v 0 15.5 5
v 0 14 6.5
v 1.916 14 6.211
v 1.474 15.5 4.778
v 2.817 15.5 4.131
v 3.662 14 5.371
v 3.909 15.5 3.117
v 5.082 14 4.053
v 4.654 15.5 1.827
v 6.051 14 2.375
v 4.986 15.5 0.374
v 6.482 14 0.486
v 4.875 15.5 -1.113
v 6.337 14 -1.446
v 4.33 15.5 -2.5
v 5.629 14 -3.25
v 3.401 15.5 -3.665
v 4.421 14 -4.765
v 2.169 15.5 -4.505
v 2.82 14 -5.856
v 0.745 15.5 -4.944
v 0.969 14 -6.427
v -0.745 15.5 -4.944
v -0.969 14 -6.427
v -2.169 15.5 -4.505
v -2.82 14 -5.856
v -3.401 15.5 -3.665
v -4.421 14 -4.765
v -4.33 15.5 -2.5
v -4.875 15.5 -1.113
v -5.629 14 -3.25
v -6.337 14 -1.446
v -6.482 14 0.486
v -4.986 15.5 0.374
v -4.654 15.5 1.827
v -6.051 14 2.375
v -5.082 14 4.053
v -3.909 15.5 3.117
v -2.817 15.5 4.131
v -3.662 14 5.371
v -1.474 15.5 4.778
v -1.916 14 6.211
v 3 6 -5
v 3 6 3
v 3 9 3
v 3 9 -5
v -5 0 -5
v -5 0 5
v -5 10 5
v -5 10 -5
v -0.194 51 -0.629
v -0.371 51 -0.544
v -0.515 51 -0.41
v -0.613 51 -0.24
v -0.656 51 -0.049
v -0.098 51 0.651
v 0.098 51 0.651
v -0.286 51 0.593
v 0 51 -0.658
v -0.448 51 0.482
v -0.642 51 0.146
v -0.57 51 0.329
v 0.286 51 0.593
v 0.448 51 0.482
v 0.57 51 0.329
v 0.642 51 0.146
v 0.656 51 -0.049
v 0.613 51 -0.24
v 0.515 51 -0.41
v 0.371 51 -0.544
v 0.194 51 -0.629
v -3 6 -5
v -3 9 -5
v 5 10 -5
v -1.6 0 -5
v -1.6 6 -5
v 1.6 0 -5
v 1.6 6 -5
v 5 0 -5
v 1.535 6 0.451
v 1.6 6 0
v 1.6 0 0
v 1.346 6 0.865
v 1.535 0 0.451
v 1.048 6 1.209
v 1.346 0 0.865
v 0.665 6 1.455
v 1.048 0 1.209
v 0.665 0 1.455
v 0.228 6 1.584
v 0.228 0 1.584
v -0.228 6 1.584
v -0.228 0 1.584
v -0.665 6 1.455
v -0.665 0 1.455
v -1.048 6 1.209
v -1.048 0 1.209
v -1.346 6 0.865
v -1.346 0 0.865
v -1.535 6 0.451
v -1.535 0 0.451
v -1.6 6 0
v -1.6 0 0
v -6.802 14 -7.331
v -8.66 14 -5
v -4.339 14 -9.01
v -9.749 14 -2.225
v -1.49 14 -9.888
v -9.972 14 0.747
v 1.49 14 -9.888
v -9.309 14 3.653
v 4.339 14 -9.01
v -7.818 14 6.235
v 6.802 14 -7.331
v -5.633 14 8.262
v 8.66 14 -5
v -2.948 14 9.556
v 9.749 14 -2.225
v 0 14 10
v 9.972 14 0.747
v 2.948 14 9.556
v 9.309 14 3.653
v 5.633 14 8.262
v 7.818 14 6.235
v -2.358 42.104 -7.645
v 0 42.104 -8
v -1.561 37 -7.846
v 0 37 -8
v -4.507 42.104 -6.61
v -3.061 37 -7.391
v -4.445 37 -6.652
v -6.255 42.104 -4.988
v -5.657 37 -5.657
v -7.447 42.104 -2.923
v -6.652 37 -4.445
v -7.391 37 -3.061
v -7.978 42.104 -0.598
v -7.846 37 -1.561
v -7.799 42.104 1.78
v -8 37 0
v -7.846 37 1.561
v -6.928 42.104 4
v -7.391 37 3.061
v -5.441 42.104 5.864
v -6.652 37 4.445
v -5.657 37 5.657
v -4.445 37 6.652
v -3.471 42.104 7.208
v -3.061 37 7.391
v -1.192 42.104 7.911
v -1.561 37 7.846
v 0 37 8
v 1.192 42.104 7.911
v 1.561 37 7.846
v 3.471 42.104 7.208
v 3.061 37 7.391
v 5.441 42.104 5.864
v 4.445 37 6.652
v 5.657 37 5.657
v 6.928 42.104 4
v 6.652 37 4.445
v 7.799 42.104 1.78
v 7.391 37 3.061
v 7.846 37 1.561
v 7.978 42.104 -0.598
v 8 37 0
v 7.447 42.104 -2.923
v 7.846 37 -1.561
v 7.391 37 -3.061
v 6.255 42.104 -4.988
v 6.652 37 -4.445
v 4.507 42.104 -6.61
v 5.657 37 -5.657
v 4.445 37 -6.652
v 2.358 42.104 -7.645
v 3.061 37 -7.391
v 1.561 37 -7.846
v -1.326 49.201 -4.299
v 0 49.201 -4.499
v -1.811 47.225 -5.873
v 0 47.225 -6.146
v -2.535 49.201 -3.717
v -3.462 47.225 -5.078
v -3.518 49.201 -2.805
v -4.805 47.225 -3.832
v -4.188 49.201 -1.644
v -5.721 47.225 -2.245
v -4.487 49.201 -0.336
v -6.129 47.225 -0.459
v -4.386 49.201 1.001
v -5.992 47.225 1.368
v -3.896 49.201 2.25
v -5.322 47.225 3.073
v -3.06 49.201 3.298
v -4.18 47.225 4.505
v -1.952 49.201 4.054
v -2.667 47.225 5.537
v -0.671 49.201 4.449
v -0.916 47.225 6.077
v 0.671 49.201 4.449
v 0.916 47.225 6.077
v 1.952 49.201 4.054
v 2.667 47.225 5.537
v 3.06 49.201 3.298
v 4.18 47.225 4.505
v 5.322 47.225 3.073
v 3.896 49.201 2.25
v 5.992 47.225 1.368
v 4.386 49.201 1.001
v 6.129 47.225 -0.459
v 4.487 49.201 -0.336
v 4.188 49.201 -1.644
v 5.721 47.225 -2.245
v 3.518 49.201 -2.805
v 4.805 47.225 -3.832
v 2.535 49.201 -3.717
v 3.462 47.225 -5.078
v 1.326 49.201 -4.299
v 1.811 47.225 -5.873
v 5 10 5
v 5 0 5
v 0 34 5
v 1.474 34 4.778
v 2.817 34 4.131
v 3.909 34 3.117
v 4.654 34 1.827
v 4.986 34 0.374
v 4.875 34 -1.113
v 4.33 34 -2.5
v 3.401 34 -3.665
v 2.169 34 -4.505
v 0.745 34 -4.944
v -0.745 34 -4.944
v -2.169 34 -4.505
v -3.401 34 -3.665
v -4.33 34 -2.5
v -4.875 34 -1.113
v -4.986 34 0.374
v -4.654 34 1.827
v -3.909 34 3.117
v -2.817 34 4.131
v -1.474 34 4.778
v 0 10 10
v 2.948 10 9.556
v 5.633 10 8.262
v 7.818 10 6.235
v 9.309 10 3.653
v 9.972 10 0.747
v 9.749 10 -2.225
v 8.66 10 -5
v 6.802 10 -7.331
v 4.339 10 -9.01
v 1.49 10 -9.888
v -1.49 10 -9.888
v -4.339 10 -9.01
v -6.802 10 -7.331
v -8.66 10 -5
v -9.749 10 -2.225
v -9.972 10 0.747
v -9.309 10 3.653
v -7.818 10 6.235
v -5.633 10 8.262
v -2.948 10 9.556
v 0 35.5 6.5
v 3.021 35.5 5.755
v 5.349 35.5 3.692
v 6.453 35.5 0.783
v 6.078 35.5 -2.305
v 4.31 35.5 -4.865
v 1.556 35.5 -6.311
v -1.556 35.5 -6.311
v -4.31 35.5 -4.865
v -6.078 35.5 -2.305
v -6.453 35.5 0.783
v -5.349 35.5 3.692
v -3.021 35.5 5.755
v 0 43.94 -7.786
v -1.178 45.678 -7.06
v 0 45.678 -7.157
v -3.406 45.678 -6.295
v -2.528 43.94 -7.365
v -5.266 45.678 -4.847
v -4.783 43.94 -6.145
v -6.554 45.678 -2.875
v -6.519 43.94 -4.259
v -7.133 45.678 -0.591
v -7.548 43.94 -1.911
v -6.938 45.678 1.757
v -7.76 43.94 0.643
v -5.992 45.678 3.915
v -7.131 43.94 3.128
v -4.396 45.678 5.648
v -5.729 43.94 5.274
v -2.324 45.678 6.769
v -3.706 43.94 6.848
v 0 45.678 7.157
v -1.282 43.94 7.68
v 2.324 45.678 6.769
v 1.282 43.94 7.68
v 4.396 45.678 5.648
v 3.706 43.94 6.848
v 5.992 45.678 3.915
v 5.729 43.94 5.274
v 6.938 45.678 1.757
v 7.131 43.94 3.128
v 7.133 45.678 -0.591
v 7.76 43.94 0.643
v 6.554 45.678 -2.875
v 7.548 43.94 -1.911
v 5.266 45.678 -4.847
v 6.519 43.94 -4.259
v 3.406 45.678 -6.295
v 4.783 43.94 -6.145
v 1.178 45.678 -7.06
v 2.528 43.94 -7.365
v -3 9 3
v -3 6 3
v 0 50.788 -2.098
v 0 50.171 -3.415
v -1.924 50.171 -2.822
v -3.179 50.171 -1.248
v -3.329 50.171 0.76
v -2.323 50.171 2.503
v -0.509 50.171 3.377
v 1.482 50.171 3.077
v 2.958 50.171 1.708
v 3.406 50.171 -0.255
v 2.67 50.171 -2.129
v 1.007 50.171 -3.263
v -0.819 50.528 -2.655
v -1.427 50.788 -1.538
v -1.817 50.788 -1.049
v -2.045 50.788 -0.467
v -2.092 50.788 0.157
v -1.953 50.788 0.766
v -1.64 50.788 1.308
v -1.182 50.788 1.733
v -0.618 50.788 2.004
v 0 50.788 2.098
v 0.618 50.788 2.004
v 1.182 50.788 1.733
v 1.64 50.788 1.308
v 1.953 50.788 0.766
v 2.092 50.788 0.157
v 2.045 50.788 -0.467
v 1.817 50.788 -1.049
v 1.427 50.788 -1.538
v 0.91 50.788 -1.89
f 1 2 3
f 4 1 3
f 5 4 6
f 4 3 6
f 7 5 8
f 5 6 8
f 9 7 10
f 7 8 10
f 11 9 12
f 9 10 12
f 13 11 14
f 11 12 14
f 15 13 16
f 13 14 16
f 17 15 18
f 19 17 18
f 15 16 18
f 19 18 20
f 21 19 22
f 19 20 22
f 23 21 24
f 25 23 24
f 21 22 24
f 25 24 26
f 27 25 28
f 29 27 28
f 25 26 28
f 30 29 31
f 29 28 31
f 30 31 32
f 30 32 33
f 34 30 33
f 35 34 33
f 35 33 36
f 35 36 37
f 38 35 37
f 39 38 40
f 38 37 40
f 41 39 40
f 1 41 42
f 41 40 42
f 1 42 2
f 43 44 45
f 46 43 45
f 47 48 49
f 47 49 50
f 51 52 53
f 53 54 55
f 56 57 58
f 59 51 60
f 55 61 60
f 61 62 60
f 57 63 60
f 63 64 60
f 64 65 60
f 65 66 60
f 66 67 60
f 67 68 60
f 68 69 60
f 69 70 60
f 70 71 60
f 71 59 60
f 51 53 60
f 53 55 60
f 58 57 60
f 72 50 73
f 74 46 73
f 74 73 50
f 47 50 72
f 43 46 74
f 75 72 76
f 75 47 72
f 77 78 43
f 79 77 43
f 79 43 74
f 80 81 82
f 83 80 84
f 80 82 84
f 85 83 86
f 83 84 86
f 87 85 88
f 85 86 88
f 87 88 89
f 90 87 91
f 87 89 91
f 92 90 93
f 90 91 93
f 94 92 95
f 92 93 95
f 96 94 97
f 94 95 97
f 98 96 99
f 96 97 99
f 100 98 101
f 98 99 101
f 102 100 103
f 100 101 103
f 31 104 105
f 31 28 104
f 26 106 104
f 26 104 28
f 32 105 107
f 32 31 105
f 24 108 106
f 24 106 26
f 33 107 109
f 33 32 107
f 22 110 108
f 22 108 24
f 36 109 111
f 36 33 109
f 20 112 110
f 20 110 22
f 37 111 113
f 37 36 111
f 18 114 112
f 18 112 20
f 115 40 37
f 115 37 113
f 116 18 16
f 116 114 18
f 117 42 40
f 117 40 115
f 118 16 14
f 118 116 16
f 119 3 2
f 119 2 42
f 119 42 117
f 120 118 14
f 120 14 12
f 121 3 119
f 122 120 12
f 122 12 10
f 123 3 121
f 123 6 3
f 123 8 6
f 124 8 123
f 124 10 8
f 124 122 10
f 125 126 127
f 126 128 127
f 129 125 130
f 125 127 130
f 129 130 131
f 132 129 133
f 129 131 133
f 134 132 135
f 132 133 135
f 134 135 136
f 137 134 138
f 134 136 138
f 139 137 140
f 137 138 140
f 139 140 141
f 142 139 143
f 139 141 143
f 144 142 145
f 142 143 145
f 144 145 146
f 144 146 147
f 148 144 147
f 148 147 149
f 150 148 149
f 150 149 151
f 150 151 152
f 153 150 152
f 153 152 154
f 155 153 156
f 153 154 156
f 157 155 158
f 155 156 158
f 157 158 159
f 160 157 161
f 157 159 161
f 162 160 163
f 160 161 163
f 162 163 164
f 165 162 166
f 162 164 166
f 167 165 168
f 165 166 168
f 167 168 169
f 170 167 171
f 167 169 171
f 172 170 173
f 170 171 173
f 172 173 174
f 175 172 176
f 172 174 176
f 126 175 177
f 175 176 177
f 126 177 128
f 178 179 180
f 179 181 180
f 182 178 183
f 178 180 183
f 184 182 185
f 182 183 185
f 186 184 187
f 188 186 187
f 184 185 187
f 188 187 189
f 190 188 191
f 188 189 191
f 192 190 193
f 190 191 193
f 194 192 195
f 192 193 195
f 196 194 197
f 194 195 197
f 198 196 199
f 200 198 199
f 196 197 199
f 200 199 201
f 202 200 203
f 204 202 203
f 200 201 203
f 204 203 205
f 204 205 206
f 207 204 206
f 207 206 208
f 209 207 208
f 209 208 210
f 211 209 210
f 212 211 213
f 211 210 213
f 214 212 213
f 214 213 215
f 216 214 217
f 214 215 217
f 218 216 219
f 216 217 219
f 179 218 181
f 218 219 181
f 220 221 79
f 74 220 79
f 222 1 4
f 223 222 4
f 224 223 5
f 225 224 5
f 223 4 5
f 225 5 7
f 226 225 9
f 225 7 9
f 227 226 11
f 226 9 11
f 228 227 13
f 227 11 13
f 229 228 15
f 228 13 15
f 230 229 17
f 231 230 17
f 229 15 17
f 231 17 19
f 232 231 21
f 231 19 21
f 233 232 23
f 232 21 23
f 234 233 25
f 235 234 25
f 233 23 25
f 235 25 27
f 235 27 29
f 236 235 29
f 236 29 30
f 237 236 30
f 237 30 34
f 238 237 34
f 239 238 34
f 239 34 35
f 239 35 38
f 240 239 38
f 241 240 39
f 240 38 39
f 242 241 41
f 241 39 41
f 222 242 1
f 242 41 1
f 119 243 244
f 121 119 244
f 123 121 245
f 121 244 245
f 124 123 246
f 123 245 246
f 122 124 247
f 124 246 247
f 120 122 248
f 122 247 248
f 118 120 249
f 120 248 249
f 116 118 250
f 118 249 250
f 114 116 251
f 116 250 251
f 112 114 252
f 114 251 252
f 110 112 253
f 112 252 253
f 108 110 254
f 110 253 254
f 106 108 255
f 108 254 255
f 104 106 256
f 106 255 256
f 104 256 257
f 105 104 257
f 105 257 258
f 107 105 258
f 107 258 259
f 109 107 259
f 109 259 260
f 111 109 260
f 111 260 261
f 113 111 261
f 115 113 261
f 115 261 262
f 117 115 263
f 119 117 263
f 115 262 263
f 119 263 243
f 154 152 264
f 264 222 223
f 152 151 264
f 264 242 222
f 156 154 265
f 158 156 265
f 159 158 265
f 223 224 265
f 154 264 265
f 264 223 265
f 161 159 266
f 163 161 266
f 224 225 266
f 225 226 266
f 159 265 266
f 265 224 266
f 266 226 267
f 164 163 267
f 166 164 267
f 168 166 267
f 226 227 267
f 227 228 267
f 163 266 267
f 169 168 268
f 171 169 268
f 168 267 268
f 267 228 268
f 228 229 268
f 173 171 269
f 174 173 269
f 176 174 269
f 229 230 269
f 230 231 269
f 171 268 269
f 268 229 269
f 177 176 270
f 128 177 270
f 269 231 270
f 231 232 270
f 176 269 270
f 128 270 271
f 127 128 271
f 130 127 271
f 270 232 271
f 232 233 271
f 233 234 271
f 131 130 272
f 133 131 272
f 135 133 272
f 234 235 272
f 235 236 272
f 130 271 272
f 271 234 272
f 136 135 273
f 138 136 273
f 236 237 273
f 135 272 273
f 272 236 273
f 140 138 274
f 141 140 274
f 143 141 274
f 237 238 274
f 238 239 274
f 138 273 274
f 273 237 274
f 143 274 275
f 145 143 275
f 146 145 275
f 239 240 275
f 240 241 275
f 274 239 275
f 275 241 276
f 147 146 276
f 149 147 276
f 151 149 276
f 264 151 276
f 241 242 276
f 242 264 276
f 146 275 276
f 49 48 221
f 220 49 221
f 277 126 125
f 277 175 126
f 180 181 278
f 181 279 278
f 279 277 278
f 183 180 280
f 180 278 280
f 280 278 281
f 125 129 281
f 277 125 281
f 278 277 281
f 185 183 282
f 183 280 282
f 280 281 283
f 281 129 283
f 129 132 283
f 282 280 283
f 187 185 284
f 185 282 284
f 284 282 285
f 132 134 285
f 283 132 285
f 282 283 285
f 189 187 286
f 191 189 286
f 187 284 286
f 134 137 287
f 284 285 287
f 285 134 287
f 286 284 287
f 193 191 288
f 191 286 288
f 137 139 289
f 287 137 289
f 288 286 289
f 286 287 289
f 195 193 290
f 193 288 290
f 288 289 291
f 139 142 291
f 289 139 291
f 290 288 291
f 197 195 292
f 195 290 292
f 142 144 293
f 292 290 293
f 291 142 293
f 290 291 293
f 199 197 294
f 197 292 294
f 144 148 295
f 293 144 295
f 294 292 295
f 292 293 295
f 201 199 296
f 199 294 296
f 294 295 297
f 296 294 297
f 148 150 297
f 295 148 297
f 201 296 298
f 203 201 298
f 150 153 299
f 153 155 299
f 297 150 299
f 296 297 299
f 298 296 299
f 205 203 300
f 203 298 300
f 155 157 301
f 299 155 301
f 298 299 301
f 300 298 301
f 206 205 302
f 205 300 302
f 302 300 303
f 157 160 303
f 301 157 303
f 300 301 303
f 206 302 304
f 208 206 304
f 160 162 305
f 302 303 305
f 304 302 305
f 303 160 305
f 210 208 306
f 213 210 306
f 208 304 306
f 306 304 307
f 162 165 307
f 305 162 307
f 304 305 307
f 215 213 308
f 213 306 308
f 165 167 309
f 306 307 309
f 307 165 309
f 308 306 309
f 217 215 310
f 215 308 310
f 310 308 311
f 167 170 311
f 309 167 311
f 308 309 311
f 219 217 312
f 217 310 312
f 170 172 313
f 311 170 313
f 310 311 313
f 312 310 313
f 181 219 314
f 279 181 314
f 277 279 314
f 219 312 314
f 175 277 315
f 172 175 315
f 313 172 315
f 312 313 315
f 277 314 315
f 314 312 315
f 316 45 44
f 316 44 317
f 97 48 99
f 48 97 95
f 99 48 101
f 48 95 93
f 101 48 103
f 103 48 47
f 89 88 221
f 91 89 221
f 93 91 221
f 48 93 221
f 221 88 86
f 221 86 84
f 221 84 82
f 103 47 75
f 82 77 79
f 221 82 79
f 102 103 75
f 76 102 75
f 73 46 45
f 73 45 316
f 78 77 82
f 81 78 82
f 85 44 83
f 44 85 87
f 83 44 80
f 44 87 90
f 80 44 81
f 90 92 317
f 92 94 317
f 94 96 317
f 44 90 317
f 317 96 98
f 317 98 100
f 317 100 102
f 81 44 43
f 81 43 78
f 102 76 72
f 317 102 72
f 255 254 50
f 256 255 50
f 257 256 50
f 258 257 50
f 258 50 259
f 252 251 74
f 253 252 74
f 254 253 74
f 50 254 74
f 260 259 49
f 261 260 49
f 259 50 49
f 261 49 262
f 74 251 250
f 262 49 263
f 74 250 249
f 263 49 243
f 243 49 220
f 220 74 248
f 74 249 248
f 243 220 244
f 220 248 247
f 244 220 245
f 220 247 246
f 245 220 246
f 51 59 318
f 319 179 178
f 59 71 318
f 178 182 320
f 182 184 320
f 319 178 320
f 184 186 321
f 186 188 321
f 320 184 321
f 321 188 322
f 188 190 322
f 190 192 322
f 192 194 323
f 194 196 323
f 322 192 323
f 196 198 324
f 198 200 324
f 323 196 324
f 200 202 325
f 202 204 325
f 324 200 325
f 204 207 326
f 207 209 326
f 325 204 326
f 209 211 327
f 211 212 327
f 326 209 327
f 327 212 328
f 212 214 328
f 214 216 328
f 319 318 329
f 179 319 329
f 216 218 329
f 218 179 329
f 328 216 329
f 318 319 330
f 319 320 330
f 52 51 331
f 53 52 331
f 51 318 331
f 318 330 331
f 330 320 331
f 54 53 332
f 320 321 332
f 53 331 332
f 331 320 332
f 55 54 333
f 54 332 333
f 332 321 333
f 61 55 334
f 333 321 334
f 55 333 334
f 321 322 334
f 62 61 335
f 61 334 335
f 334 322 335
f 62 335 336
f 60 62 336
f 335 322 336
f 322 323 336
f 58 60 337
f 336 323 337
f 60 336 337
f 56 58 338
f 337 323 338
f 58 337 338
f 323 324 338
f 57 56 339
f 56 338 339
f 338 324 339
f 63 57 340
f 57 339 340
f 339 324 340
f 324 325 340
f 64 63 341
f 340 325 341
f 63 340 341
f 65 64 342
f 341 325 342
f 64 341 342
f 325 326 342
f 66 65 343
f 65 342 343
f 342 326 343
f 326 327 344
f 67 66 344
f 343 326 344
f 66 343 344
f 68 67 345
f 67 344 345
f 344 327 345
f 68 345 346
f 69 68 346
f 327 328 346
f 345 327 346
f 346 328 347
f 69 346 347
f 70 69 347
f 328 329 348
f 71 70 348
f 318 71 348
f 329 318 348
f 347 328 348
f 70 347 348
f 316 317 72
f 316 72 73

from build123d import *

# Parameters (mm, degrees)
SKETCH1_W           = 10
SKETCH1_H           = 10
BOSS_EXTRUDE1_DEPTH = 10
SKETCH2_R           = 10
BOSS_EXTRUDE2_DEPTH = 4
SKETCH3_R           = 5
BOSS_EXTRUDE3_DEPTH = 23
CHAMFER1_SIZE       = 3
SKETCH7_R           = 1.6
CUT_EXTRUDE2_DEPTH  = 6
SKETCH8_W           = 6
SKETCH8_H           = 3
CUT_EXTRUDE3_DEPTH  = 8
CUT_EXTRUDE4_REACH  = 54.924
CHAMFER2_SIZE       = 1.5


with BuildPart() as part:
    # Sketch1 → Boss-Extrude1 (new body)
    with BuildSketch(Plane(origin=(0, 0, 0), x_dir=(1, 0, 0), z_dir=(0, 1, 0))):
        Rectangle(SKETCH1_W, SKETCH1_H)
    extrude(amount=BOSS_EXTRUDE1_DEPTH)

    # Sketch2 → Boss-Extrude2 (add)
    with BuildSketch(Plane(origin=(0, 10, 0), x_dir=(1, 0, 0), z_dir=(0, 1, 0))):
        with Locations(Location((0, 0, 0), (0, 0, 270))):
            Circle(SKETCH2_R)
    extrude(amount=BOSS_EXTRUDE2_DEPTH)

    # Sketch3 → Boss-Extrude3 (add)
    with BuildSketch(Plane(origin=(0, 14, 0), x_dir=(1, 0, 0), z_dir=(0, 1, 0))):
        with Locations(Location((0, 0, 0), (0, 0, 270))):
            Circle(SKETCH3_R)
    extrude(amount=BOSS_EXTRUDE3_DEPTH)

    # Sketch4 → Revolve1 (revolve)
    with BuildSketch(Plane.XY, mode=Mode.PRIVATE) as revolve1_sk:
        with BuildLine():
            Line((0, 37), (0, 51))
            Line((0, 51), (0.65812527, 51))
            ThreePointArc((0.65812527, 51), (2.778902251, 50.527947106), (4.499231668, 49.200921998))
            Line((4.499231668, 49.200921998), (6.145770237, 47.225075716))
            ThreePointArc((6.145770237, 47.225075716), (7.522172621, 44.827002629), (8, 42.103600519))
            Line((8, 42.103600519), (8, 37))
            Line((8, 37), (0, 37))
        make_face()
    revolve(revolve1_sk.sketch.rotate(Axis((0, 37, 0), (0, 1, 0)), 90), axis=Axis((0, 37, 0), (0, 1, 0)))

    # Chamfer1
    chamfer1_edges = [part.edges().sort_by_distance(p)[0] for p in [
        (0, 37, -5),
    ]]
    chamfer(chamfer1_edges, length=CHAMFER1_SIZE - 0.0001)  # a hair under: the kernel refuses the full size

    # Sketch7 → Cut-Extrude2 (cut)
    with BuildSketch(Plane.XZ):
        with Locations(Location((0, 0, 0), (0, 0, 270))):
            Circle(SKETCH7_R)
    extrude(amount=-CUT_EXTRUDE2_DEPTH, mode=Mode.SUBTRACT)

    # Sketch8 → Cut-Extrude3 (cut)
    with BuildSketch(Plane(origin=(0, 0, -5), x_dir=(-1, 0, 0), z_dir=(0, 0, -1))):
        with Locations((0, 7.5)):
            Rectangle(SKETCH8_W, SKETCH8_H)
    extrude(amount=-CUT_EXTRUDE3_DEPTH, mode=Mode.SUBTRACT)

    # Sketch9 → Cut-Extrude4 (cut, up to next)
    with BuildSketch(Plane.XZ, mode=Mode.PRIVATE) as cut_extrude4_sk1:
        with BuildLine():
            ThreePointArc((1.6, 0), (0, -1.6), (-1.6, 0))
            Line((-1.6, 0), (-1.6, -5))
            Line((-1.6, -5), (1.6, -5))
            Line((1.6, -5), (1.6, 0))
        make_face()
    cut_extrude4_tool1 = extrude(cut_extrude4_sk1.sketch, amount=-CUT_EXTRUDE4_REACH, mode=Mode.PRIVATE) & part.part
    add(cut_extrude4_tool1.solids().sort_by_distance((0, 0, -3.111284))[0], mode=Mode.SUBTRACT)

    # Chamfer2
    chamfer2_edges = [part.edges().sort_by_distance(p)[0] for p in [
        (0, 14, -5),
    ]]
    chamfer(chamfer2_edges, length=CHAMFER2_SIZE)


solid = part.part
